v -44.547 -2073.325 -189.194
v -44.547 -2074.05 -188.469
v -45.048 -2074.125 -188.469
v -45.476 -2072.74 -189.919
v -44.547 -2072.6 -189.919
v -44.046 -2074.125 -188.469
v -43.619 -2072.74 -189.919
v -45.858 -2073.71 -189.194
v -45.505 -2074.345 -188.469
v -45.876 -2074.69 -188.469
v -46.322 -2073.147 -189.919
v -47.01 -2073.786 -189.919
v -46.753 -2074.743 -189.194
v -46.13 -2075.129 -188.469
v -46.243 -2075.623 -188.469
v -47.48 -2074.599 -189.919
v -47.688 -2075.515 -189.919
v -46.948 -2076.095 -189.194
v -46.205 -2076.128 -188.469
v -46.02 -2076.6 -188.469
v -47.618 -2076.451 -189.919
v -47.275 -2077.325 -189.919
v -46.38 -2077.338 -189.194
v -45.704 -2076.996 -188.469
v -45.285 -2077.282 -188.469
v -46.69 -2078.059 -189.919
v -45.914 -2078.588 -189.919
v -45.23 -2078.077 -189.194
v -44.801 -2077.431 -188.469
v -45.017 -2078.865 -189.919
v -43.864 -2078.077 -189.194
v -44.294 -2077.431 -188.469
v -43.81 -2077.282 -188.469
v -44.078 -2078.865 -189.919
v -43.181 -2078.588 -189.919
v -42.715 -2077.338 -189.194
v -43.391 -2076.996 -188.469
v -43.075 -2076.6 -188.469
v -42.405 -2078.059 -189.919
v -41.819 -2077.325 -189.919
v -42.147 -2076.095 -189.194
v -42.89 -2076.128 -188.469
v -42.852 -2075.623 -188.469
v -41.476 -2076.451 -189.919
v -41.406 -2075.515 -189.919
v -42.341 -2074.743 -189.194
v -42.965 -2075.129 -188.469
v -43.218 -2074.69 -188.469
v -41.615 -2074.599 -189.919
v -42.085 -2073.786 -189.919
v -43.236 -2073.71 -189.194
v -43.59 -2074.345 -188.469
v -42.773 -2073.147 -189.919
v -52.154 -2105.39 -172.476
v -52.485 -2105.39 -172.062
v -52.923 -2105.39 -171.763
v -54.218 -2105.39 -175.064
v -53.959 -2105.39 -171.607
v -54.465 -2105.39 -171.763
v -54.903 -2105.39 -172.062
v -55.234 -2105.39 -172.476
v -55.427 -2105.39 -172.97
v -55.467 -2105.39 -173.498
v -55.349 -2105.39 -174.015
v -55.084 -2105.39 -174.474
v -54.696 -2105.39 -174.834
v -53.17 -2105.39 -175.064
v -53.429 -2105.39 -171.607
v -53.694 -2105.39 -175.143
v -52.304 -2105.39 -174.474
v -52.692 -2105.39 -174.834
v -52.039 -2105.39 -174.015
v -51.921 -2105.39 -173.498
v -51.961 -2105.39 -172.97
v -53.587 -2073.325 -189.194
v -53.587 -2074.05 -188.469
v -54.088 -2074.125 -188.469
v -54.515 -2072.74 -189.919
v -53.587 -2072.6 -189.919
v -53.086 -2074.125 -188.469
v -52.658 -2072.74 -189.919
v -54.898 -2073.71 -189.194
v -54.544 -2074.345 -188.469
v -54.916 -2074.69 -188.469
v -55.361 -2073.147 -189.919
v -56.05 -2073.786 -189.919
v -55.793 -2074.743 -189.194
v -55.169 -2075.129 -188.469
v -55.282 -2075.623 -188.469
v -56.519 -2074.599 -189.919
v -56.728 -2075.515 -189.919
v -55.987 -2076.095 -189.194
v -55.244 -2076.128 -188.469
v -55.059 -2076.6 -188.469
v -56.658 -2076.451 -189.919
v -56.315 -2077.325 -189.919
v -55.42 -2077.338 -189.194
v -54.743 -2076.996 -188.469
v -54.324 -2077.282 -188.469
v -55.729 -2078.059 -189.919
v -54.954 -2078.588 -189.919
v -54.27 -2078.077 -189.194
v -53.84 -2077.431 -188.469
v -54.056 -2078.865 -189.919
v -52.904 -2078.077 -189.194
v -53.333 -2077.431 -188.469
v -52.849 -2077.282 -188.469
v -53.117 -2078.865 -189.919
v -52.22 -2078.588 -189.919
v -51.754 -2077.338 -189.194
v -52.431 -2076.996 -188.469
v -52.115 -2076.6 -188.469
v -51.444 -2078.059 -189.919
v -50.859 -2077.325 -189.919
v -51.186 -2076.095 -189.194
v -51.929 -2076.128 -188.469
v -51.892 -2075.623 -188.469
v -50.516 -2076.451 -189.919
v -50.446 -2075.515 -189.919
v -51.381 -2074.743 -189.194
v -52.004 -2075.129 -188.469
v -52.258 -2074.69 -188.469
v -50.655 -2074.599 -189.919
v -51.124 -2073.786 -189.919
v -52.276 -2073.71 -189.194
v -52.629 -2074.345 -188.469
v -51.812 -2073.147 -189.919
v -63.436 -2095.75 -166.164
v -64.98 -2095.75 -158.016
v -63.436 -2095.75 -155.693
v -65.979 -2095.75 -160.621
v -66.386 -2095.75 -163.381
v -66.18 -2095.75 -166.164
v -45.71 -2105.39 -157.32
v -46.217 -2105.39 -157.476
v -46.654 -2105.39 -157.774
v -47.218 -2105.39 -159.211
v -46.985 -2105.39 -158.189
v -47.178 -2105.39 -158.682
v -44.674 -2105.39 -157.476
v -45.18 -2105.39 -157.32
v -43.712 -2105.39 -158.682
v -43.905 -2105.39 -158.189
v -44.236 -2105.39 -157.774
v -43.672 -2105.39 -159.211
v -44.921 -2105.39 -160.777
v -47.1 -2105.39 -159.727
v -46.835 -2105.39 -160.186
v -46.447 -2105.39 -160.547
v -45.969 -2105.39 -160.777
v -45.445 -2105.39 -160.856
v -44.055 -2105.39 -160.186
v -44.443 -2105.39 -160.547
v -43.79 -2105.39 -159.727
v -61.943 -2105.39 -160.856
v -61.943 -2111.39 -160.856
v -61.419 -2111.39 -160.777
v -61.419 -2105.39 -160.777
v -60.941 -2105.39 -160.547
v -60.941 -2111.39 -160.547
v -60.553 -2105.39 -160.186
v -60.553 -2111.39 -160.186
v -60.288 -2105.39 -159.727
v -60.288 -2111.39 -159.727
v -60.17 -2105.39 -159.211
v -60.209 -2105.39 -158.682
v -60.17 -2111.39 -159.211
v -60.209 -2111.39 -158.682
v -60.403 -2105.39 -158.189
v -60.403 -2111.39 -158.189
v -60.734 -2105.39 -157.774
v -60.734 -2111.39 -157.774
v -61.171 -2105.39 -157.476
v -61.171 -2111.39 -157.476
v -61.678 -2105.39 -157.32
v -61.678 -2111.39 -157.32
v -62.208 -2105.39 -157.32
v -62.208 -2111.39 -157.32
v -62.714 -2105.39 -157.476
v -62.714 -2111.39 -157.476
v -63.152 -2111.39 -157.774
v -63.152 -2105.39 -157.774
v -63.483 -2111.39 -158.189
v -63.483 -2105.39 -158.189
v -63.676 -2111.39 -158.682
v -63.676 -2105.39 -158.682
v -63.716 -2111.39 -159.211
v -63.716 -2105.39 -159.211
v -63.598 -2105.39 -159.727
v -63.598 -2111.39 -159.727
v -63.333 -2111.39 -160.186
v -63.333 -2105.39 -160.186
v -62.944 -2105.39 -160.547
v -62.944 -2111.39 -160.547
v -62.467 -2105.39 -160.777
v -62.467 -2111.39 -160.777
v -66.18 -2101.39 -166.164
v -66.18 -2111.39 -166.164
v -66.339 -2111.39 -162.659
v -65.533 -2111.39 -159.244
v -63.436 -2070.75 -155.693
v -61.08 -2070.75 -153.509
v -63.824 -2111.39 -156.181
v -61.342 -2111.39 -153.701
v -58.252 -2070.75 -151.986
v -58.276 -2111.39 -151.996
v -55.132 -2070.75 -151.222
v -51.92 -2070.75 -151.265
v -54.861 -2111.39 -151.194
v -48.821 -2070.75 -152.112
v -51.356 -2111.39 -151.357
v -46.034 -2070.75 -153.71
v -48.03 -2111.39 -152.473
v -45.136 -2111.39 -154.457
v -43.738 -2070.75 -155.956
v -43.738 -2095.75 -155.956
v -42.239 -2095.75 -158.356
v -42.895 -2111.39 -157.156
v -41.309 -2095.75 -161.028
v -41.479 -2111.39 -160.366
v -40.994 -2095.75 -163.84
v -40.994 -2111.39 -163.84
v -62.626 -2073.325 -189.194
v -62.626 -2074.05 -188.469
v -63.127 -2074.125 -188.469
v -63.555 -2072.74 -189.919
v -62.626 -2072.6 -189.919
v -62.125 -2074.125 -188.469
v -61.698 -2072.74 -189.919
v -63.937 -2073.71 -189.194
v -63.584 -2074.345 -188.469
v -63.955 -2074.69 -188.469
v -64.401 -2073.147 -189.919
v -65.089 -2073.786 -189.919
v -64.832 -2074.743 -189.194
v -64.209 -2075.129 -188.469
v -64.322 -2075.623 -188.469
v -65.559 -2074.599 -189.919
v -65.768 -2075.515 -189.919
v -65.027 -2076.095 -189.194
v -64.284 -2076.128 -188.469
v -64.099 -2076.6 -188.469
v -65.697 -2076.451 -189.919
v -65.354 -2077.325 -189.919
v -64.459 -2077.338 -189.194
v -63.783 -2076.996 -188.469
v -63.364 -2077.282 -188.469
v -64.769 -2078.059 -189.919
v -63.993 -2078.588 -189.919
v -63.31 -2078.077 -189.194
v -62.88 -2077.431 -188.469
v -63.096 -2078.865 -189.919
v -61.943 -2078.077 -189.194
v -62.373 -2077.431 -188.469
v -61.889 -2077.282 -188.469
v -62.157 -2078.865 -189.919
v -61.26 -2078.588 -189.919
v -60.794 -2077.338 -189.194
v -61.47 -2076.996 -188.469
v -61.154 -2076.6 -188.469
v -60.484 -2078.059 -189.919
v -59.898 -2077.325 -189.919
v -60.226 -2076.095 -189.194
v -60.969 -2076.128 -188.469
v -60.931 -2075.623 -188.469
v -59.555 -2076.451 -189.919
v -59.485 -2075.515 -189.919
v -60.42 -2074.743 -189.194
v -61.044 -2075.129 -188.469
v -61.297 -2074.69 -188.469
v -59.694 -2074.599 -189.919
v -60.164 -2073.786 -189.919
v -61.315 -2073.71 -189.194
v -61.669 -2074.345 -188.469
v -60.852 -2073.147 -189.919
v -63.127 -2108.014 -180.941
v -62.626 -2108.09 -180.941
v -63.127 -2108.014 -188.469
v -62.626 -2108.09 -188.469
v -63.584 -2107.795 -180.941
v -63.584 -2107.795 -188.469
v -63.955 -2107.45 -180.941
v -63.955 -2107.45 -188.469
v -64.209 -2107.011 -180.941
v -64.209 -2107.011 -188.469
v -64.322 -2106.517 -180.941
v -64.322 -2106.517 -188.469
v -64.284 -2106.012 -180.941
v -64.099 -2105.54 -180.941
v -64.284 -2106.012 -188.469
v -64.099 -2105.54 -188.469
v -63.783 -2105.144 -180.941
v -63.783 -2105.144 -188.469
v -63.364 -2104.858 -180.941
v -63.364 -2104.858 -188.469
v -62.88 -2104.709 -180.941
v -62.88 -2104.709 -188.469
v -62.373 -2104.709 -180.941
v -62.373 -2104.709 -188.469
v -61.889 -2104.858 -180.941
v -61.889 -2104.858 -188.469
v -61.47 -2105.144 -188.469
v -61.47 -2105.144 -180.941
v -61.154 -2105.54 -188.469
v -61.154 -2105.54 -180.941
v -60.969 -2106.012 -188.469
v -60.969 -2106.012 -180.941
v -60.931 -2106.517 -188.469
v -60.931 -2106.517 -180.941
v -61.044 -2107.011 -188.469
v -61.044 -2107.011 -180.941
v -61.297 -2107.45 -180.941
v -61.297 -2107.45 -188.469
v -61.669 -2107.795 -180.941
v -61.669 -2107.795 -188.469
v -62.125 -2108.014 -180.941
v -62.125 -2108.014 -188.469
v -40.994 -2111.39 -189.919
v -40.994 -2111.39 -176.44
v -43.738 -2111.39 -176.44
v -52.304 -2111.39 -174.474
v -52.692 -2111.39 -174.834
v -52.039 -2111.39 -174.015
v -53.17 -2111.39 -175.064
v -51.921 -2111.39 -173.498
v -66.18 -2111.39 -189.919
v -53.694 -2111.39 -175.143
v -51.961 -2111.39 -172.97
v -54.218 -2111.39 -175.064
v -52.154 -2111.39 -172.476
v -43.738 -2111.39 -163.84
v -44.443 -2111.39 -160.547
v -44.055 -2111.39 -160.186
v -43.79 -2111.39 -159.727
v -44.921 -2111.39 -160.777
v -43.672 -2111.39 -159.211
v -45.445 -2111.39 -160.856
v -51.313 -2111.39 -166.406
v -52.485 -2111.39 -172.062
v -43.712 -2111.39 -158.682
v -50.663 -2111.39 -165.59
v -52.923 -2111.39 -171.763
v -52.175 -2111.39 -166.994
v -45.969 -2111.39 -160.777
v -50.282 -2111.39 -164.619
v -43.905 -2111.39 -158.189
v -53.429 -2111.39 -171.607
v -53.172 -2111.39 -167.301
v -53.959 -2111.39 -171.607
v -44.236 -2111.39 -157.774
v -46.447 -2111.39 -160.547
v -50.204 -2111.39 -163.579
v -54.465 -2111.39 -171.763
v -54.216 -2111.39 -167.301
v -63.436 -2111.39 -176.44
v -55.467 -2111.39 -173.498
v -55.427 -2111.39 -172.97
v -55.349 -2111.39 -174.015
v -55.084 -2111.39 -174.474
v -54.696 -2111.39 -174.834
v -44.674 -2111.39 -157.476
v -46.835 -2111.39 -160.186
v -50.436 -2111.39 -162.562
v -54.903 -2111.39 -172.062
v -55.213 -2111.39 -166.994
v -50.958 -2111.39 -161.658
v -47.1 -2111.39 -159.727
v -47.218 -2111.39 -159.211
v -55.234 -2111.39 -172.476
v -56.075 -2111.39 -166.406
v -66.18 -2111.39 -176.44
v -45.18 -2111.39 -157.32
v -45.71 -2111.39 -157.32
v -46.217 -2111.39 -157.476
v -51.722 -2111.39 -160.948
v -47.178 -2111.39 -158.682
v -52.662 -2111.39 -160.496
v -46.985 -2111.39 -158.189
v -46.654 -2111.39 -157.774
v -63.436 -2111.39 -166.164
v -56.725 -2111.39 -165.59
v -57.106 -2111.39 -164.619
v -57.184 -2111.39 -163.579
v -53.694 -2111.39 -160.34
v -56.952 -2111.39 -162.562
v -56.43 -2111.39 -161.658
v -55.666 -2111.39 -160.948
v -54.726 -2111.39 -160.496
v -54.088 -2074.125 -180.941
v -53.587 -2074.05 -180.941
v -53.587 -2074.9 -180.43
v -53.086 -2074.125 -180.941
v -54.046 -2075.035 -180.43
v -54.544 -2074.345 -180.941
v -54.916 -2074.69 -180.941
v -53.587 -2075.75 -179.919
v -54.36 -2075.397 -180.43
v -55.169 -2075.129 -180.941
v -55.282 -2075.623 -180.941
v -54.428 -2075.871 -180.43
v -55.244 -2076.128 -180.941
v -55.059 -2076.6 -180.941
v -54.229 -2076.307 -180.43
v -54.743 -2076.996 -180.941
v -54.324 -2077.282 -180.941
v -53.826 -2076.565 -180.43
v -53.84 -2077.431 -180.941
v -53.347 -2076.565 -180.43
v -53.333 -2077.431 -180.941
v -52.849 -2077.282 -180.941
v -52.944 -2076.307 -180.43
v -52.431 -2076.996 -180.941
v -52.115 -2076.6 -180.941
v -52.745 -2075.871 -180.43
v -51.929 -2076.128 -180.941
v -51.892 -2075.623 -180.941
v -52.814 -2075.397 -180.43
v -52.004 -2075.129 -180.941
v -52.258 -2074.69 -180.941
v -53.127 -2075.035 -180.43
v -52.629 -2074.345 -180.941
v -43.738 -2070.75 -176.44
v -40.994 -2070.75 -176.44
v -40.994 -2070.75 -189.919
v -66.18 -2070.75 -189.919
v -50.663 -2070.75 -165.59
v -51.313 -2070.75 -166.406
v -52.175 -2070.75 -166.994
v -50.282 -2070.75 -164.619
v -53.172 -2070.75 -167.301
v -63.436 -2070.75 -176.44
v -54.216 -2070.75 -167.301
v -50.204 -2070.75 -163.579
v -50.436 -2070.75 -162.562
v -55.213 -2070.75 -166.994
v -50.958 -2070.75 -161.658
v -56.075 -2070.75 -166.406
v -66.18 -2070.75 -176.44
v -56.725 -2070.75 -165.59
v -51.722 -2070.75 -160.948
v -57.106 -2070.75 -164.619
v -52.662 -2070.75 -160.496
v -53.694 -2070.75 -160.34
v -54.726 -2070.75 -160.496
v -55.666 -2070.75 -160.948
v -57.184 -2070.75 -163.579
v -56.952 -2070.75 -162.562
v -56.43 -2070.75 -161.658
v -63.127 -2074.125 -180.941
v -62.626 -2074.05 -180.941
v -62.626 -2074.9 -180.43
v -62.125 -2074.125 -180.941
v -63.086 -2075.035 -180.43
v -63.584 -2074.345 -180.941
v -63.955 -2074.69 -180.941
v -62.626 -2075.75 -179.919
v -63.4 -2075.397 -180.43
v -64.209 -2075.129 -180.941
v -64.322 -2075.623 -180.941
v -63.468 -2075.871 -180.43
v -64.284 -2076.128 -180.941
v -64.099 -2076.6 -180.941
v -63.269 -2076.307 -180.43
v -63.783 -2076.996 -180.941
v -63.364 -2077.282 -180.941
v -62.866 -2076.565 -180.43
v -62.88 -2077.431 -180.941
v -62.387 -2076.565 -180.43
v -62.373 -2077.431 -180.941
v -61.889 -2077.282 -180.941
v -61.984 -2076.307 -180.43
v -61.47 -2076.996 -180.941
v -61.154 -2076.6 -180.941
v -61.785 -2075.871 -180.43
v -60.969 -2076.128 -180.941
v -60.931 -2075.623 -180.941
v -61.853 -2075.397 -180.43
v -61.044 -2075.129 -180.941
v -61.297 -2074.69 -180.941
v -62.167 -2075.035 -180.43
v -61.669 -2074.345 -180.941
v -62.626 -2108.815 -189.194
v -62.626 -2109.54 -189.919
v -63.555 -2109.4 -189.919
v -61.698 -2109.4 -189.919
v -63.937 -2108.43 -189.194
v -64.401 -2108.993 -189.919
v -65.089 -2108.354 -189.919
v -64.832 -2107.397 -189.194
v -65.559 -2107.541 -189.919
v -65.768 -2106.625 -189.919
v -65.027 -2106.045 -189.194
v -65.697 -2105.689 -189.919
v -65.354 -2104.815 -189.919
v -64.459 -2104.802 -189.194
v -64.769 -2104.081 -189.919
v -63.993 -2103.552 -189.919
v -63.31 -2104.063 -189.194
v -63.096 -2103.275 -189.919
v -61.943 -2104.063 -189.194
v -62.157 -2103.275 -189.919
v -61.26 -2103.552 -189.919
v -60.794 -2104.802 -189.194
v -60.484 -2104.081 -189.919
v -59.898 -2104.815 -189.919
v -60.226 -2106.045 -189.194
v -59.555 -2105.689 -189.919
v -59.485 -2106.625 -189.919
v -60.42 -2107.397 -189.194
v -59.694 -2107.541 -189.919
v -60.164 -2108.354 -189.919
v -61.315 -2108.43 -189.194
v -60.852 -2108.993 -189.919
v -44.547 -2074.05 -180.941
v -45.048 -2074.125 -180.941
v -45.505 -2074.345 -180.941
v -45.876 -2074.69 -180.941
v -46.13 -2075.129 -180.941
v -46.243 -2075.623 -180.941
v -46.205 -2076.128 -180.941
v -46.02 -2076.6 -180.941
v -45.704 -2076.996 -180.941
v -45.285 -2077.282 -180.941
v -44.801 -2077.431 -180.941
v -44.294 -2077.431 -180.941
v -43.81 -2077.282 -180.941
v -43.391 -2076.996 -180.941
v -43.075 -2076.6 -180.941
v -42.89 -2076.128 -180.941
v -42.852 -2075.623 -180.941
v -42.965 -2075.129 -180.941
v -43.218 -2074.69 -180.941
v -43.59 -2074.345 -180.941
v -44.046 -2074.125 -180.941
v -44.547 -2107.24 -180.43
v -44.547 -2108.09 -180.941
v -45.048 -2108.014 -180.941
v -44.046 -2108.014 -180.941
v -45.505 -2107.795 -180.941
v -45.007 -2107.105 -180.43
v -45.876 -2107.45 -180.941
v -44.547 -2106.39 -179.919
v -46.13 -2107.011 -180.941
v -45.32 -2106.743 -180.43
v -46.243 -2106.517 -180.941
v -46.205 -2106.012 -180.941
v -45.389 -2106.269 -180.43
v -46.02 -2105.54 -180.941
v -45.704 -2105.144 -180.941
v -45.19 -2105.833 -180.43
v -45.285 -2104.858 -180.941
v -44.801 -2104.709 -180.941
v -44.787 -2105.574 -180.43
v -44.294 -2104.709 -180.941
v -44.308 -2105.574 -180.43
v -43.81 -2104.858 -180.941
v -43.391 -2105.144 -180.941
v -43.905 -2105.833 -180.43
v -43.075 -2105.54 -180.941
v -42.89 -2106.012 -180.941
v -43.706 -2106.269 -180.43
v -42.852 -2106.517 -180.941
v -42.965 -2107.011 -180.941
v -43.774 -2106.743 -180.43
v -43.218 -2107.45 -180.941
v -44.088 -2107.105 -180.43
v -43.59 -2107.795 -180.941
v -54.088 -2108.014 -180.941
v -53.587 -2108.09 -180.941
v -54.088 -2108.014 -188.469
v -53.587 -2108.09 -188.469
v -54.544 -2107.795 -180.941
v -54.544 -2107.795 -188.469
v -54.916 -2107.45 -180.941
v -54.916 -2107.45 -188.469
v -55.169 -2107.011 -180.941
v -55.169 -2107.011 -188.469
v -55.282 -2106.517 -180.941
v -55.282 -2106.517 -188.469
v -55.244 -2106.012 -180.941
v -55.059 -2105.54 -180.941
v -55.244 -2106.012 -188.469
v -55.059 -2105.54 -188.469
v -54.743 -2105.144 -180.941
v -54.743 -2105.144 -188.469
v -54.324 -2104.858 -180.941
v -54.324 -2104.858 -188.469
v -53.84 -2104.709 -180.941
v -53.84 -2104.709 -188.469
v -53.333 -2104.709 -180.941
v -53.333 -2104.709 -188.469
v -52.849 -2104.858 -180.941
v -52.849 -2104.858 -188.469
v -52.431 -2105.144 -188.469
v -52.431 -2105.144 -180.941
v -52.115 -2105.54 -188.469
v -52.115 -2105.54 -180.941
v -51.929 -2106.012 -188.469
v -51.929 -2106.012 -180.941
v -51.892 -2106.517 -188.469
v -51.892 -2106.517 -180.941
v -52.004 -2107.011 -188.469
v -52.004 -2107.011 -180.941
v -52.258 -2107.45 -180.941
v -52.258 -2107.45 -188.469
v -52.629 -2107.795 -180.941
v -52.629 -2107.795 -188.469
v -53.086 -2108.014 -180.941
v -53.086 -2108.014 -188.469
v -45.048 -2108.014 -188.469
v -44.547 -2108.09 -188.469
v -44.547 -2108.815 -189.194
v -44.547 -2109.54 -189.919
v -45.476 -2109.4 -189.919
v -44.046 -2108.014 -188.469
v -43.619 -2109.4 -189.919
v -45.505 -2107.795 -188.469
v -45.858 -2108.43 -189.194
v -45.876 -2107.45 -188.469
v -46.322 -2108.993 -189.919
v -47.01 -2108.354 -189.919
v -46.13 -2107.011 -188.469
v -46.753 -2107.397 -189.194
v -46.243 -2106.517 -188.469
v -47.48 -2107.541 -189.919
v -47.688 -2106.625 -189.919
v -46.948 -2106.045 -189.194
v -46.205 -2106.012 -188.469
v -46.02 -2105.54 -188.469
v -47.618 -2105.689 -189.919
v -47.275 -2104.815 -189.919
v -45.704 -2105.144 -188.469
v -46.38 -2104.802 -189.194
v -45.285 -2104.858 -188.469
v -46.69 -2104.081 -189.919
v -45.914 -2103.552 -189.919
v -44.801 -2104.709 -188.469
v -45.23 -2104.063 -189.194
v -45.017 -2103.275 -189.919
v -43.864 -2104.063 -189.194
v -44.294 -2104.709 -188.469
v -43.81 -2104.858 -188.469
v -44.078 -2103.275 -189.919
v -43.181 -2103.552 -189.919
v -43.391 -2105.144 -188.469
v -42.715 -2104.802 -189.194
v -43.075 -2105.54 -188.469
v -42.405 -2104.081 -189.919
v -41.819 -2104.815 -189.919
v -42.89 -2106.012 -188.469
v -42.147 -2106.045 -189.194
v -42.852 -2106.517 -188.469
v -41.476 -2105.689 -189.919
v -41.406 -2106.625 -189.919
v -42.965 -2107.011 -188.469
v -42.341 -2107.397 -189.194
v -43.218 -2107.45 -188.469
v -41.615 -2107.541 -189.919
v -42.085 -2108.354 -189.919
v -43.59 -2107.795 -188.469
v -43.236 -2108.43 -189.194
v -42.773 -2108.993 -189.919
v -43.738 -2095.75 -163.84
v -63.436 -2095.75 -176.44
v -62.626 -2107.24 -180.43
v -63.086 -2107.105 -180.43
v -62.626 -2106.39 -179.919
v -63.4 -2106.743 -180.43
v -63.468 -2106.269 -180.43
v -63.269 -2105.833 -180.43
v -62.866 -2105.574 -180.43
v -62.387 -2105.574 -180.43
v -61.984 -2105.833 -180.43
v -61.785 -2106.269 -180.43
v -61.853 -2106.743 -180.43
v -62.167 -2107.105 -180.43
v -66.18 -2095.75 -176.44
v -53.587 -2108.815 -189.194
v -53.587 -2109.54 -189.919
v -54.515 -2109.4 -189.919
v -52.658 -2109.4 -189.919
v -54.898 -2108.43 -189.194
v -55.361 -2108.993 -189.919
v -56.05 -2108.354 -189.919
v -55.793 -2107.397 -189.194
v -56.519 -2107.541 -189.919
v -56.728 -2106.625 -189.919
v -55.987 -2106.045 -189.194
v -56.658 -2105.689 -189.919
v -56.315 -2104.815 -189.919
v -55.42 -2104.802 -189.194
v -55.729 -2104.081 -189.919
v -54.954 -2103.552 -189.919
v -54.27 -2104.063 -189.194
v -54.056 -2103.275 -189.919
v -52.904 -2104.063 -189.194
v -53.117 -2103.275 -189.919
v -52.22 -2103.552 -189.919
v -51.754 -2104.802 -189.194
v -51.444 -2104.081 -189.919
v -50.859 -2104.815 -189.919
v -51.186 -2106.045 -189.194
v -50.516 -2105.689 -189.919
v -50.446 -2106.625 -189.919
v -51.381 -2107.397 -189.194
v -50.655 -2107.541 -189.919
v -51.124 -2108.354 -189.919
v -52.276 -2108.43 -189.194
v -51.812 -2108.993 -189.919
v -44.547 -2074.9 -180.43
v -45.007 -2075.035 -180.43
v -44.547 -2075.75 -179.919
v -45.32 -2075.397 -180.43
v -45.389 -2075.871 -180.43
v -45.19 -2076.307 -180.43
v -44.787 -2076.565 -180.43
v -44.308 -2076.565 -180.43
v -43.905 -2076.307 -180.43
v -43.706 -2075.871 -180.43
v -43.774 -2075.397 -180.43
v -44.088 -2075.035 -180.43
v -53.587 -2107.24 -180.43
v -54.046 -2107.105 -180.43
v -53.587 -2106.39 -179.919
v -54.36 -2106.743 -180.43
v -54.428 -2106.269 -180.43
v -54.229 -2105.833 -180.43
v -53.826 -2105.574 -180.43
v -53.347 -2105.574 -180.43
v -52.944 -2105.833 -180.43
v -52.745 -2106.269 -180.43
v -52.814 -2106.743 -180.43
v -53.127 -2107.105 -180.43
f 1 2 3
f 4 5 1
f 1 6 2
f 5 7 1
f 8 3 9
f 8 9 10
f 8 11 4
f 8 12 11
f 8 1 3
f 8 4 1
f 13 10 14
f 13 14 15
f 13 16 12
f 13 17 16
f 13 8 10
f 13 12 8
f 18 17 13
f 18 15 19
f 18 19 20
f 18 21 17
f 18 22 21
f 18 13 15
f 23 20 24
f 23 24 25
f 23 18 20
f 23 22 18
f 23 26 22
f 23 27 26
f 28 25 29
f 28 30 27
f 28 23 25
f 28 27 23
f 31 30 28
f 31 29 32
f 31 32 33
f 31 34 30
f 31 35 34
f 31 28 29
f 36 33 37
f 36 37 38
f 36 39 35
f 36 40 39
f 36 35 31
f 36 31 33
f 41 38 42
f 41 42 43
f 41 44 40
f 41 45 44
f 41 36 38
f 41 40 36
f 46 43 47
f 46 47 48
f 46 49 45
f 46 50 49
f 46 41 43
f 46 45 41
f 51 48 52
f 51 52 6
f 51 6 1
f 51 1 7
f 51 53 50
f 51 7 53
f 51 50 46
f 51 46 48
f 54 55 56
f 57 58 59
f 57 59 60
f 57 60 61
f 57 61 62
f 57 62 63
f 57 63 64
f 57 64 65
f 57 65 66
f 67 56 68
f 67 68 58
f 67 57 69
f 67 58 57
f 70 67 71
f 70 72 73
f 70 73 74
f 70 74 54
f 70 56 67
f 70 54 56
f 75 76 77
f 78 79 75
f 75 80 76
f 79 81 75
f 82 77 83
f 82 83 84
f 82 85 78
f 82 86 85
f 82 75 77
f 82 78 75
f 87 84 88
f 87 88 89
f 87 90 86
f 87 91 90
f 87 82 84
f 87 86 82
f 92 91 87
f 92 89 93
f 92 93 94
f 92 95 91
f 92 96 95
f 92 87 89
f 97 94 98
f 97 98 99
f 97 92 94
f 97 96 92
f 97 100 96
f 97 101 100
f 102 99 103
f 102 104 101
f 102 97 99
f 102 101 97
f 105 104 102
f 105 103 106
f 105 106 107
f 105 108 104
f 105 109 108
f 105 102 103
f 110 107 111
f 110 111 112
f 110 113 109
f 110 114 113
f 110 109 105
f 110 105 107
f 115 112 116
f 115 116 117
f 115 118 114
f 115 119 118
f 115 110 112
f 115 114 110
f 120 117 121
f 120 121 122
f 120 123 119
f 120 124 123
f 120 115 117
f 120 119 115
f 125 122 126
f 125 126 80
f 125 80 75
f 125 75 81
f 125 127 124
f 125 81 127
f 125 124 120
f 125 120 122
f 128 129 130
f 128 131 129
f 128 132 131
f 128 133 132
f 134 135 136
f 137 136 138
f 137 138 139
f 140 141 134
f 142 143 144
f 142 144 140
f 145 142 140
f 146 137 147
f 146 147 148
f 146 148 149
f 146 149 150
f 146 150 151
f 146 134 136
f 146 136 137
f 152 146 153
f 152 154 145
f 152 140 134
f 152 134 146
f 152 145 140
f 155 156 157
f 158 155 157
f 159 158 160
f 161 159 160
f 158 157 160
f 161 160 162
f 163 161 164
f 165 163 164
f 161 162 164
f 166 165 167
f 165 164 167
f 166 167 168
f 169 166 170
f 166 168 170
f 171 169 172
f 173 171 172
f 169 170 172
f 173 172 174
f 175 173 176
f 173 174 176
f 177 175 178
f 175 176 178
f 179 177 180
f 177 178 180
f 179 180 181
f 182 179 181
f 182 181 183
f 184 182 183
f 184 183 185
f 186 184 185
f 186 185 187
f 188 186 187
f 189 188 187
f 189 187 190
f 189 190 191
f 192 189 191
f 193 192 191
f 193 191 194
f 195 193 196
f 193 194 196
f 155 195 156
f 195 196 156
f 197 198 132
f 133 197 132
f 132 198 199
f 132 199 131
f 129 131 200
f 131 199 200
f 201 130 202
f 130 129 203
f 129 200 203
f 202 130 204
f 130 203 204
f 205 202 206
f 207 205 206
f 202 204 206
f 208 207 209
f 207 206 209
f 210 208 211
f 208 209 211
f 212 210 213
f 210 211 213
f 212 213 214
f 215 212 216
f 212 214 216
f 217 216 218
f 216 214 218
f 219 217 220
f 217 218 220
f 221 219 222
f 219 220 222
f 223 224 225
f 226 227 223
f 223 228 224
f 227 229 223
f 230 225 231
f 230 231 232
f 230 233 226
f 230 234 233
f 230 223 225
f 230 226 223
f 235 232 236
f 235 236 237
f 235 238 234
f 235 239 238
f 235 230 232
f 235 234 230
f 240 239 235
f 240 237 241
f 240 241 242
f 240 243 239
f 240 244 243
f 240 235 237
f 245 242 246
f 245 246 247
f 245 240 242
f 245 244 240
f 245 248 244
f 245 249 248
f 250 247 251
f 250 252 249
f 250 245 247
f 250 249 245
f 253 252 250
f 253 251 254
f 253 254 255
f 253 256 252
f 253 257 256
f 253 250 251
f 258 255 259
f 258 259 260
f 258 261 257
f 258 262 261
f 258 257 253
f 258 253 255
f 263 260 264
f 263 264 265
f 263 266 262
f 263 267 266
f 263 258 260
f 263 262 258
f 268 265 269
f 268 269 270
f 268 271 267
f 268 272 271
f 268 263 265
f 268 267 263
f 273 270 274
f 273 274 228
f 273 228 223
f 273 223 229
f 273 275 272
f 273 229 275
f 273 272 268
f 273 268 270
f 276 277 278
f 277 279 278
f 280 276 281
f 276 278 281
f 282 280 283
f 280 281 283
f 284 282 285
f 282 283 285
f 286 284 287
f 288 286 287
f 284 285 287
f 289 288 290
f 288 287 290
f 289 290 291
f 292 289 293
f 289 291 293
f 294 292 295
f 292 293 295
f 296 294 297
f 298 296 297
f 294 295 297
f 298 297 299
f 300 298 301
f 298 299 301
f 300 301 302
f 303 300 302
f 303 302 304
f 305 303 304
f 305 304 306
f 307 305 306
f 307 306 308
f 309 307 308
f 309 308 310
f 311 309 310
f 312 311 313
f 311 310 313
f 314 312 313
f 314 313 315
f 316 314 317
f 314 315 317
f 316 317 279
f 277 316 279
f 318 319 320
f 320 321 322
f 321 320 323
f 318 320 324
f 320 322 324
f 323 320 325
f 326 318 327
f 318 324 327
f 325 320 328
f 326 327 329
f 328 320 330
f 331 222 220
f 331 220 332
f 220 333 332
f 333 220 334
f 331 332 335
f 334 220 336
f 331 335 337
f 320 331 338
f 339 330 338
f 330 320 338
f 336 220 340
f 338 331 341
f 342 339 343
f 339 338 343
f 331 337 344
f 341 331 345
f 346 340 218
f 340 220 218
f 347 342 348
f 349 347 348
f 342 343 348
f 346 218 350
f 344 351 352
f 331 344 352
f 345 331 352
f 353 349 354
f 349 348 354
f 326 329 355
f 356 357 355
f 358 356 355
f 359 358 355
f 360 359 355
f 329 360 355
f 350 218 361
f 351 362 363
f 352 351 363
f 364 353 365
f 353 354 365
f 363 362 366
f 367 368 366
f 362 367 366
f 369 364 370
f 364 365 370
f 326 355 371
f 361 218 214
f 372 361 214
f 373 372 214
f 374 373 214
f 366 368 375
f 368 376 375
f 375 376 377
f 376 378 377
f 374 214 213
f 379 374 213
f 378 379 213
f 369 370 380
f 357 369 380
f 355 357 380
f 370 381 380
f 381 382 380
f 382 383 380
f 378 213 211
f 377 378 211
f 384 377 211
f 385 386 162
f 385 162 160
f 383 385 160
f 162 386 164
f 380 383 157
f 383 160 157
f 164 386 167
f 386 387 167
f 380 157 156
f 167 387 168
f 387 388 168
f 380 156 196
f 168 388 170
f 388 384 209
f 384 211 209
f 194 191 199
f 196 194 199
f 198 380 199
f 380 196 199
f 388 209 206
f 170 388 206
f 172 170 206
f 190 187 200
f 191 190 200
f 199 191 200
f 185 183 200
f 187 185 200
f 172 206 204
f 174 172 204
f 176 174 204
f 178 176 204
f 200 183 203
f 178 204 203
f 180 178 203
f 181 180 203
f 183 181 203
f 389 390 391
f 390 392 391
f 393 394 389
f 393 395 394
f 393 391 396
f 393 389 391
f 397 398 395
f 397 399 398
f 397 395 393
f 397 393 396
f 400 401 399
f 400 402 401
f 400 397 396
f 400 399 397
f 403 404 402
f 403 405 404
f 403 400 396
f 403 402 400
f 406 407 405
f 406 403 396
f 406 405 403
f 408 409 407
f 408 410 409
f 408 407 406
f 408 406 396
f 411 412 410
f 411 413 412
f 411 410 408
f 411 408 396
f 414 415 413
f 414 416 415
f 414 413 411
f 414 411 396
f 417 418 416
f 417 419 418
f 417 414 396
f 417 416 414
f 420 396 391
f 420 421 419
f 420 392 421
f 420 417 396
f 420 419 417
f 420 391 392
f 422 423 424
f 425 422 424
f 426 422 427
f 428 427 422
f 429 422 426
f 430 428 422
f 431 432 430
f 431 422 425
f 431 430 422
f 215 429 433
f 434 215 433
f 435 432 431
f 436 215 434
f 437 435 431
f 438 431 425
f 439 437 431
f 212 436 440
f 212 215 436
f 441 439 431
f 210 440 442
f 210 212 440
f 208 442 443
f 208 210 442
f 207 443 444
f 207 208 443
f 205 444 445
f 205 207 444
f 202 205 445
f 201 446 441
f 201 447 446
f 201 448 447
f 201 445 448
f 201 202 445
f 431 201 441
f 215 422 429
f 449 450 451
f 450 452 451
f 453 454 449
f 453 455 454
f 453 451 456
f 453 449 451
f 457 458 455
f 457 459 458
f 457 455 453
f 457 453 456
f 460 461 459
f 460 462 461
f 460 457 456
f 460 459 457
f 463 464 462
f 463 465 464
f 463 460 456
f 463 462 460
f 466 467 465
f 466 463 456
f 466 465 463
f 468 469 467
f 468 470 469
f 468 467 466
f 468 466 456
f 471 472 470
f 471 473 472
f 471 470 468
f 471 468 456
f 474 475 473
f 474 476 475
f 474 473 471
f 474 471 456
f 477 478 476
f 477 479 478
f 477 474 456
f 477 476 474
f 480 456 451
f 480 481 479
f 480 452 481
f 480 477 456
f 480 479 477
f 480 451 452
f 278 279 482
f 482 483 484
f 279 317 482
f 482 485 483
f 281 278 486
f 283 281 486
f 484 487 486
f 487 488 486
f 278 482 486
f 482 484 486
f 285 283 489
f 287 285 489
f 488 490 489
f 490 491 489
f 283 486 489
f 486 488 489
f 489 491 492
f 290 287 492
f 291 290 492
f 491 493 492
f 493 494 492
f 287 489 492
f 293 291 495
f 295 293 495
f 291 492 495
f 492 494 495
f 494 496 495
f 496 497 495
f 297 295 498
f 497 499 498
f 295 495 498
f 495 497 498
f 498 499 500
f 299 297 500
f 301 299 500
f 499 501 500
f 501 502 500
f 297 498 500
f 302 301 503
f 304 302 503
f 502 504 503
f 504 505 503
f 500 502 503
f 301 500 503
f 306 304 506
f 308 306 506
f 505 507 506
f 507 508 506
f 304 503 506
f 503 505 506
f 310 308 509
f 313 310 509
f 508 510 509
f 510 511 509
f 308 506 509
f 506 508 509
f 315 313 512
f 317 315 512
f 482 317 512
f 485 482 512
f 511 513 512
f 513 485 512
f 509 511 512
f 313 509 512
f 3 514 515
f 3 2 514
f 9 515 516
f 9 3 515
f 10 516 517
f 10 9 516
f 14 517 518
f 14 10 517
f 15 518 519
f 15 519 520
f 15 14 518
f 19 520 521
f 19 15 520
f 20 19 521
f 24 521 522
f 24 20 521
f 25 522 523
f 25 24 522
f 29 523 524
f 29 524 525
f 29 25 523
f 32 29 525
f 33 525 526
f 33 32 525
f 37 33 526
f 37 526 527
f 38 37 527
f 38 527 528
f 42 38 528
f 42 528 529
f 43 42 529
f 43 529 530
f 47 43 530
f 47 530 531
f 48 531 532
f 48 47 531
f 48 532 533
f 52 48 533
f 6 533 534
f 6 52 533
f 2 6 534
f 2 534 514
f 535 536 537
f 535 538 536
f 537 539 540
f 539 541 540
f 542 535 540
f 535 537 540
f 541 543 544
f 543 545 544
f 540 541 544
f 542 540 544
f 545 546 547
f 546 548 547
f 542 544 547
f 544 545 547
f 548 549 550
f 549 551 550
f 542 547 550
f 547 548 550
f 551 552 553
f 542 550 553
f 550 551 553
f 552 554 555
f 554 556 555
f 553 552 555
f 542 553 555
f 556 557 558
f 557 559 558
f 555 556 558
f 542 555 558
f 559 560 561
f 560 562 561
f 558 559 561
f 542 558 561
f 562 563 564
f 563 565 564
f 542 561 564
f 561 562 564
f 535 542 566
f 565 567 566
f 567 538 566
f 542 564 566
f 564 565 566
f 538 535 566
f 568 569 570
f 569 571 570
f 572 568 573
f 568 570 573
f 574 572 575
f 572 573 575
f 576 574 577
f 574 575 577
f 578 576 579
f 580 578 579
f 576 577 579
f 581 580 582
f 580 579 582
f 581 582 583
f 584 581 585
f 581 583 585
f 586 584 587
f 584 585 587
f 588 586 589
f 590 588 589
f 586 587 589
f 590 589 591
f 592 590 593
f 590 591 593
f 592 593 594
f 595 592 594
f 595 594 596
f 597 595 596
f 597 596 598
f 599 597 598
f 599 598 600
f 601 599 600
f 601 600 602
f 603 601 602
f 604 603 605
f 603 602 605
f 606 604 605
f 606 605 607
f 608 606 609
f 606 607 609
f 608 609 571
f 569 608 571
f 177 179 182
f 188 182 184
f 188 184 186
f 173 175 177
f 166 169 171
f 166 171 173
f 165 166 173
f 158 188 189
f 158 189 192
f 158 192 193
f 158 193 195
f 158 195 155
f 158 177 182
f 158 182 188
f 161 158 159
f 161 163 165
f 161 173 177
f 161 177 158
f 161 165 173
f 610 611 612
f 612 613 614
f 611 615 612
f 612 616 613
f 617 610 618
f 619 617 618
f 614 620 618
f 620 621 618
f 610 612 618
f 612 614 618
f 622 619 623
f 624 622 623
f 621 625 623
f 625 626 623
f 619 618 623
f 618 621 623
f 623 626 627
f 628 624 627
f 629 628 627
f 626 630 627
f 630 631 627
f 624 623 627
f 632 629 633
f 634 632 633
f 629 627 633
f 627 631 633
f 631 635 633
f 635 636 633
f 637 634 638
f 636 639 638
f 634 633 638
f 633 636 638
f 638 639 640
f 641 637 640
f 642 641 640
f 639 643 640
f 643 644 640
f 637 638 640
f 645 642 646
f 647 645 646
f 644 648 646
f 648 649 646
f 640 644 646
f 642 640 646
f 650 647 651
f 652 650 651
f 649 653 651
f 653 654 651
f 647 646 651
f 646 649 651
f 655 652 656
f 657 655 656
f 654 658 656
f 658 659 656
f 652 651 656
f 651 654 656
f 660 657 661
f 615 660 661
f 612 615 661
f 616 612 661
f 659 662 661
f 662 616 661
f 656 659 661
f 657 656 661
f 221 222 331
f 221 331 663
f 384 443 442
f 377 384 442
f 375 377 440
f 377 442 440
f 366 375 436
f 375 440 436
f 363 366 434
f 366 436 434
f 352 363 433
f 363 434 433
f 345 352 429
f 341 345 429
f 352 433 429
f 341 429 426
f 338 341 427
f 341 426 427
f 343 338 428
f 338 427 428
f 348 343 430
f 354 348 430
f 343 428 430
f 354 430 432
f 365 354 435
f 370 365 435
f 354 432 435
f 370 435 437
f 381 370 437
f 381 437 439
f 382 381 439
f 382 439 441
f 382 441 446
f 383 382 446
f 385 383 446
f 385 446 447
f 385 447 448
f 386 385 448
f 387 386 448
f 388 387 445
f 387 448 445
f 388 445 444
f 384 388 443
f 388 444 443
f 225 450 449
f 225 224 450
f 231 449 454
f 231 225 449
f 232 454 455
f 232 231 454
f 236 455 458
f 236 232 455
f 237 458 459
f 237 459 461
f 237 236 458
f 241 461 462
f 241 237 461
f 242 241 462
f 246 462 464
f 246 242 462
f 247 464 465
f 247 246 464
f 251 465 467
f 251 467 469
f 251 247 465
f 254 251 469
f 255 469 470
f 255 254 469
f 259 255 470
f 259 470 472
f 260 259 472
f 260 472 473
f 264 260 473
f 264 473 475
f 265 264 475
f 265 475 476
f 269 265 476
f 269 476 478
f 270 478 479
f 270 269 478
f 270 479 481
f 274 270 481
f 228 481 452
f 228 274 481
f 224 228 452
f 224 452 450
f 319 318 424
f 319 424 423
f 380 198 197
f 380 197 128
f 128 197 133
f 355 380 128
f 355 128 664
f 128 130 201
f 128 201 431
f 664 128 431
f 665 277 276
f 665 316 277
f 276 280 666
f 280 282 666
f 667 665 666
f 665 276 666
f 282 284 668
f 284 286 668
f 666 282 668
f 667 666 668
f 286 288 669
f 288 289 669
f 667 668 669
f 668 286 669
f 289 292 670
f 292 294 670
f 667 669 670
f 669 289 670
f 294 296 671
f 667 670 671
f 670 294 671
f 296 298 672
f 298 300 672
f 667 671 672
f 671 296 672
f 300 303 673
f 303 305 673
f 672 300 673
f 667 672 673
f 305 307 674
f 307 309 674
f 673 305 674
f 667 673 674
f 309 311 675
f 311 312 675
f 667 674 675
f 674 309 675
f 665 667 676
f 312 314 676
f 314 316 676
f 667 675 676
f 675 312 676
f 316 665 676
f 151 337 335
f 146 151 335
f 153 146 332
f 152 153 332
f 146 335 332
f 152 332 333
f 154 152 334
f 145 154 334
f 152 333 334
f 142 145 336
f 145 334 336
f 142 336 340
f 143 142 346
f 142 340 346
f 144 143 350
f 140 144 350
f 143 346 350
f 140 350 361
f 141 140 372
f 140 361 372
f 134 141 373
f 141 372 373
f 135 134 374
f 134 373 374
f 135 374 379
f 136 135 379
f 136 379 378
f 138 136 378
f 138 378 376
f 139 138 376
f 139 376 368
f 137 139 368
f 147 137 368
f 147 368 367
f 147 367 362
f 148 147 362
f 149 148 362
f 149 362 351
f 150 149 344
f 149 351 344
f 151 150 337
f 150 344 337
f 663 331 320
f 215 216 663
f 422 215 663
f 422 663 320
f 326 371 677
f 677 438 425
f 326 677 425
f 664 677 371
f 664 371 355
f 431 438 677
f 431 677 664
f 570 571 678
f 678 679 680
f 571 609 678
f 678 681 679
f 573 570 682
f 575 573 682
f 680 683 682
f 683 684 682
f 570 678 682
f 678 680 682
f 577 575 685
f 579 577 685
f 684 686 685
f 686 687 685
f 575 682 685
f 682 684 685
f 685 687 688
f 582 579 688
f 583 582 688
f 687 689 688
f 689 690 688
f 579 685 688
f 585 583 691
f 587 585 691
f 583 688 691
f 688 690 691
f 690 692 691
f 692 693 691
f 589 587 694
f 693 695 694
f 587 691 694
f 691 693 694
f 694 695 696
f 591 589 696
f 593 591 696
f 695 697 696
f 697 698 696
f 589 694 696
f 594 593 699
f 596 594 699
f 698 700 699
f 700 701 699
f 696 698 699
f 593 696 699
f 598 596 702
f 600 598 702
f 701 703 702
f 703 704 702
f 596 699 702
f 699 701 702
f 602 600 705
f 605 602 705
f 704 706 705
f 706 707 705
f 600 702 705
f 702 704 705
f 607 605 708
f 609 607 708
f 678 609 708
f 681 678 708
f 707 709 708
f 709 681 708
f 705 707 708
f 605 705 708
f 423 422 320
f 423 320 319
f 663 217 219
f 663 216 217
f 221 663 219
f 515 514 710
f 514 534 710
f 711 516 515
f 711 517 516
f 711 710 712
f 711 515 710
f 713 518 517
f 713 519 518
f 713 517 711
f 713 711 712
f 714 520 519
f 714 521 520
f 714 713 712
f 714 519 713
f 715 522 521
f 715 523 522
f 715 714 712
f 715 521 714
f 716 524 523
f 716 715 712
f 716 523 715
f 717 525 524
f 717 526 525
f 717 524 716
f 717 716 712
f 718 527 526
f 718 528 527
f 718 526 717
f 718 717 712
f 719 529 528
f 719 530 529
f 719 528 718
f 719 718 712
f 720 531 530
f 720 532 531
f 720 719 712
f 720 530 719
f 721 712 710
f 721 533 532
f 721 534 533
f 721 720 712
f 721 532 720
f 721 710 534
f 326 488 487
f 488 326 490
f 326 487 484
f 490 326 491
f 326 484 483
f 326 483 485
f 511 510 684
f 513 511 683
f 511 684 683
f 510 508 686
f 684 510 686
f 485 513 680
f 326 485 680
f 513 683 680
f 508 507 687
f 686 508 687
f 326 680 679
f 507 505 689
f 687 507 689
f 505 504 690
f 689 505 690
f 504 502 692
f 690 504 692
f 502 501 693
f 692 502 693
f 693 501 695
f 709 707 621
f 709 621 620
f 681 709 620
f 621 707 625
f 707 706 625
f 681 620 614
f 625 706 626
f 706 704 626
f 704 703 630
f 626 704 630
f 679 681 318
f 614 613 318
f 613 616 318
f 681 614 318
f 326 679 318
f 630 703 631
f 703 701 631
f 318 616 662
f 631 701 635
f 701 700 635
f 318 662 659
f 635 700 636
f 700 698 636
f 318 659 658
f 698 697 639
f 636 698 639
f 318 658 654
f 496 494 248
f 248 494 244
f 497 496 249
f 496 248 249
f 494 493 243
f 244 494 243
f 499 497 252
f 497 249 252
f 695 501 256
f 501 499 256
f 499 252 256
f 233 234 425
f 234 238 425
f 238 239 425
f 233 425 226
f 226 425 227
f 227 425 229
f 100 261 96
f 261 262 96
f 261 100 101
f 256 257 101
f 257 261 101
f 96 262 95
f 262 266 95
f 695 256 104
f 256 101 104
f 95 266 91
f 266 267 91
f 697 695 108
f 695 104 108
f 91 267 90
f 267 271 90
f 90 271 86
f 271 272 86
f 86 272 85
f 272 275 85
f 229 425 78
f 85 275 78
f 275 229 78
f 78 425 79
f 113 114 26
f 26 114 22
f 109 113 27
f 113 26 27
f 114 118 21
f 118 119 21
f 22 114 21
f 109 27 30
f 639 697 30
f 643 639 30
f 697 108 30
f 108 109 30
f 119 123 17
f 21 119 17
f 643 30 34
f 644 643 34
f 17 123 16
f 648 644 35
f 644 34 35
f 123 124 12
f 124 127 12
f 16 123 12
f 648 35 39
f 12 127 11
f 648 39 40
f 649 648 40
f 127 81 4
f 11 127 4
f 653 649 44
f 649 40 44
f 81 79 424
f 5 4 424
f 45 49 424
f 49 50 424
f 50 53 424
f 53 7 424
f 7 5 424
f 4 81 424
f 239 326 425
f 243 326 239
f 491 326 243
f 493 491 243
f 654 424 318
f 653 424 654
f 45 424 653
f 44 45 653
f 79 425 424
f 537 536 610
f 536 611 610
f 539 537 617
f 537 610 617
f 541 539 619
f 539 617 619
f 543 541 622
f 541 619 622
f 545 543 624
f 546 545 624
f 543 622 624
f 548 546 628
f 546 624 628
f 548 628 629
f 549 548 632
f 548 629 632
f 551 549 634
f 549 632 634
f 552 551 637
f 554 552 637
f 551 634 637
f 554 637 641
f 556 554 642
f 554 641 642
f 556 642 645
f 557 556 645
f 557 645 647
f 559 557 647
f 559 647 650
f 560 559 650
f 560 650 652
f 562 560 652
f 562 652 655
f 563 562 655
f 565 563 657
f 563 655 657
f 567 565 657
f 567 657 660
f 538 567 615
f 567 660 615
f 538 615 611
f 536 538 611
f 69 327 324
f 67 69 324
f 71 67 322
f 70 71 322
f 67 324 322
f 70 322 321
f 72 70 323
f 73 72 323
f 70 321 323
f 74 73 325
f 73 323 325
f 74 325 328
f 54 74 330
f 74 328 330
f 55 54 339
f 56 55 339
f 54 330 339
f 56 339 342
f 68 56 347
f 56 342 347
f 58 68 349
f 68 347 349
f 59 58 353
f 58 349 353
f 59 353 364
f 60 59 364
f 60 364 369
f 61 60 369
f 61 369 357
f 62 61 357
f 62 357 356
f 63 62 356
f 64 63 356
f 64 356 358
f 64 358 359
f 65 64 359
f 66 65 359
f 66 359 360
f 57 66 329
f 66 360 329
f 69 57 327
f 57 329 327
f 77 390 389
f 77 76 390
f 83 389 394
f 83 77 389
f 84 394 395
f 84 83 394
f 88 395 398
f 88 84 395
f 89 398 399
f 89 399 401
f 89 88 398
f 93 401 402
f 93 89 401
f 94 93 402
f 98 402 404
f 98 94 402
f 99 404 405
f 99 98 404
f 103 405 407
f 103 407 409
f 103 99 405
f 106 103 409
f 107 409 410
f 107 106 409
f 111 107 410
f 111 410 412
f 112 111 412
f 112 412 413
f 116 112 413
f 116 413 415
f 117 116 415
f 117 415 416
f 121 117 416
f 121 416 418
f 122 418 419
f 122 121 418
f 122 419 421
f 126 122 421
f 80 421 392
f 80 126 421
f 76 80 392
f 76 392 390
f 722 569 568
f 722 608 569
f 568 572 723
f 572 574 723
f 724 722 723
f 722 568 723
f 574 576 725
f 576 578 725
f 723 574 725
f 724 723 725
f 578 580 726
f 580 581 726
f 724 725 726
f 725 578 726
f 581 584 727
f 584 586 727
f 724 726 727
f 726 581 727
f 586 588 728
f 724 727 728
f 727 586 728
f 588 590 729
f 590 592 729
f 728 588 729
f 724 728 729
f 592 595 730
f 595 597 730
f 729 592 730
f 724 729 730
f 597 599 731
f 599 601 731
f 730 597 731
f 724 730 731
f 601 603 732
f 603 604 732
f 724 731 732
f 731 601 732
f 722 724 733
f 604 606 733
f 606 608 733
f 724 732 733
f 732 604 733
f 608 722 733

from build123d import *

# Parameters (mm, degrees)
SKETCH2_R                                      = 12.7
BOSS_EXTRUDE6_DEPTH                            = 40.64
SKETCH3_R                                      = 3.5
CUT_EXTRUDE1_DEPTH                             = 40.64
SKETCH4_R                                      = 1.778
CUT_EXTRUDE2_DEPTH                             = 6
BOSS_EXTRUDE8_DEPTH                            = 10
SKETCH8_W                                      = 25.185693912
SKETCH8_H                                      = 10
BOSS_EXTRUDE9_DEPTH                            = 7.284789049
BOSS_EXTRUDE10_DEPTH                           = 30.64
CSK_FOR_M3_FLAT_HEAD_MACHINE_SCREW1_AT_2_COUNT = 2
CSK_FOR_M3_FLAT_HEAD_MACHINE_SCREW1_AT_2_PITCH = 9.039543014
CSK_FOR_M3_FLAT_HEAD_MACHINE_SCREW1_AT_3_COUNT = 2
CSK_FOR_M3_FLAT_HEAD_MACHINE_SCREW1_AT_3_PITCH = 9.039543014
SKETCH16_W                                     = 3.769994858
SKETCH16_H                                     = 22.000968128
CUT_EXTRUDE3_DEPTH                             = 25
SKETCH17_W                                     = 10.276759259
SKETCH17_H                                     = 15.64
CUT_EXTRUDE4_DEPTH                             = 2.743753899
SKETCH18_W                                     = 12.6
SKETCH18_H                                     = 15.64
CUT_EXTRUDE5_DEPTH                             = 2.743753899


with BuildPart() as part:
    # Sketch2 → Boss-Extrude6 (new body)
    with BuildSketch(Plane(origin=(0, -2111.389926236, 0), x_dir=(1, 0, 0), z_dir=(0, 1, 0))):
        with Locations(Location((-53.693967541, 163.840329354, 0), (0, 0, 180))):
            Circle(SKETCH2_R)
    extrude(amount=BOSS_EXTRUDE6_DEPTH)

    # Sketch3 → Cut-Extrude1 (cut)
    with BuildSketch(Plane(origin=(0, -2070.749926236, 0), x_dir=(1, 0, 0), z_dir=(0, 1, 0))):
        with Locations(Location((-53.693967541, 163.840329354, 0), (0, 0, 270))):
            Circle(SKETCH3_R)
    extrude(amount=-CUT_EXTRUDE1_DEPTH, mode=Mode.SUBTRACT)

    # Sketch4 → Cut-Extrude2 (cut)
    with BuildSketch(Plane.XZ.offset(2111.389926236)):
        with Locations(Location((-61.942859512, -159.077829354, 0), (0, 0, 270))):
            Circle(SKETCH4_R)
        with Locations(Location((-53.693967541, -173.365329354, 0), (0, 0, 270))):
            Circle(SKETCH4_R)
        with Locations(Location((-45.44507557, -159.077829354, 0), (0, 0, 270))):
            Circle(SKETCH4_R)
    extrude(amount=-CUT_EXTRUDE2_DEPTH, mode=Mode.SUBTRACT)

    # Sketch7 → Boss-Extrude8 (add)
    with BuildSketch(Plane.XZ.offset(2111.389926236)):
        with BuildLine():
            Line((-40.993967541, -163.840329354), (-40.993967541, -182.634287878))
            Line((-40.993967541, -182.634287878), (-66.179661453, -182.634287878))
            Line((-66.179661453, -182.634287878), (-66.179661453, -166.163570095))
            ThreePointArc((-66.179661453, -166.163570095), (-52.527415502, -176.486639343), (-40.993967541, -163.840329354))
        make_face()
    extrude(amount=-BOSS_EXTRUDE8_DEPTH)

    # Sketch8 → Boss-Extrude9 (add)
    with BuildSketch(Plane(origin=(0, 0, -182.634287878), x_dir=(-1, 0, 0), z_dir=(0, 0, -1))):
        with Locations((53.586814497, -2106.389926236)):
            Rectangle(SKETCH8_W, SKETCH8_H)
    extrude(amount=BOSS_EXTRUDE9_DEPTH)

    # Sketch9 → Boss-Extrude10 (add)
    with BuildSketch(Plane(origin=(0, -2070.749926236, 0), x_dir=(1, 0, 0), z_dir=(0, 1, 0))):
        with BuildLine():
            Line((-66.179661453, 163.840329354), (-66.179661453, 189.919076927))
            Line((-66.179661453, 189.919076927), (-40.993967541, 189.919076927))
            Line((-40.993967541, 189.919076927), (-40.993967541, 163.840329354))
            ThreePointArc((-40.993967541, 163.840329354), (-53.586814497, 176.43317631), (-66.179661453, 163.840329354))
        make_face()
    extrude(amount=-BOSS_EXTRUDE10_DEPTH)

    # Sketch15 → CSK for M3 Flat Head Machine Screw1 (revolve, cut)
    with BuildSketch(Plane(origin=(-53.586814498, -2075.749926236, -189.919076927), x_dir=(0, 1, 0), z_dir=(1, 0, 0))):
        Polygon((0, 0), (0, 10), (1.7, 8.978536948), (1.7, 1.45), (3.15, 0), align=None)
    csk_for_m3_flat_head_machine_screw1 = revolve(axis=Axis((-53.586814498, -2075.749926236, -196.269076927), (0, 0, 1)), mode=Mode.SUBTRACT)

    # CSK for M3 Flat Head Machine Screw1 at 2: CSK for M3 Flat Head Machine Screw1 ×2
    with Locations(*[(-i * CSK_FOR_M3_FLAT_HEAD_MACHINE_SCREW1_AT_2_PITCH, 0, 0) for i in range(1, CSK_FOR_M3_FLAT_HEAD_MACHINE_SCREW1_AT_2_COUNT)]):
        add(csk_for_m3_flat_head_machine_screw1, mode=Mode.SUBTRACT)

    # CSK for M3 Flat Head Machine Screw1 at 3: CSK for M3 Flat Head Machine Screw1 ×2
    with Locations(*[(i * CSK_FOR_M3_FLAT_HEAD_MACHINE_SCREW1_AT_3_PITCH, 0, 0) for i in range(1, CSK_FOR_M3_FLAT_HEAD_MACHINE_SCREW1_AT_3_COUNT)]):
        add(csk_for_m3_flat_head_machine_screw1, mode=Mode.SUBTRACT)

    # Mirror1: CSK for M3 Flat Head Machine Screw1 across plane
    add(csk_for_m3_flat_head_machine_screw1.mirror(Plane.ZX.offset(-2091.069926234)), mode=Mode.SUBTRACT)

    # Mirror1 copy 1 sketch → Mirror1 copy 1 (revolve, cut)
    with BuildSketch(Plane(origin=(-62.626357512, -2106.389926232, -189.919076927), x_dir=(0, -1, 0), z_dir=(1, 0, 0))):
        Polygon((0, 0), (0, -10), (1.7, -8.978536948), (1.7, -1.45), (3.15, 0), align=None)
    revolve(axis=Axis((-62.626357512, -2106.389926232, -196.269076927), (0, 0, -1)), mode=Mode.SUBTRACT)

    # Mirror1 copy 2 sketch → Mirror1 copy 2 (revolve, cut)
    with BuildSketch(Plane(origin=(-44.547271484, -2106.389926232, -189.919076927), x_dir=(0, -1, 0), z_dir=(1, 0, 0))):
        Polygon((0, 0), (0, -10), (1.7, -8.978536948), (1.7, -1.45), (3.15, 0), align=None)
    revolve(axis=Axis((-44.547271484, -2106.389926232, -196.269076927), (0, 0, -1)), mode=Mode.SUBTRACT)

    # Sketch16 → Cut-Extrude3 (cut)
    with BuildSketch(Plane(origin=(0, -2070.749926236, 0), x_dir=(1, 0, 0), z_dir=(0, 1, 0))):
        with Locations((-65.320904983, 165.43984529)):
            Rectangle(SKETCH16_W, SKETCH16_H)
        with Locations((-41.852724011, 165.43984529)):
            Rectangle(SKETCH16_W, SKETCH16_H)
    extrude(amount=-CUT_EXTRUDE3_DEPTH, mode=Mode.SUBTRACT)

    # Sketch17 → Cut-Extrude4 (cut)
    with BuildSketch(Plane.ZY.offset(66.179661453)):
        with Locations((-171.301949724, -2103.569926236)):
            Rectangle(SKETCH17_W, SKETCH17_H)
    extrude(amount=-CUT_EXTRUDE4_DEPTH, mode=Mode.SUBTRACT)

    # Sketch18 → Cut-Extrude5 (cut)
    with BuildSketch(Plane(origin=(-40.993967541, 0, 0), x_dir=(0, 0, -1), z_dir=(1, 0, 0))):
        with Locations((170.140329354, -2103.569926236)):
            Rectangle(SKETCH18_W, SKETCH18_H)
    extrude(amount=-CUT_EXTRUDE5_DEPTH, mode=Mode.SUBTRACT)


solid = part.part
